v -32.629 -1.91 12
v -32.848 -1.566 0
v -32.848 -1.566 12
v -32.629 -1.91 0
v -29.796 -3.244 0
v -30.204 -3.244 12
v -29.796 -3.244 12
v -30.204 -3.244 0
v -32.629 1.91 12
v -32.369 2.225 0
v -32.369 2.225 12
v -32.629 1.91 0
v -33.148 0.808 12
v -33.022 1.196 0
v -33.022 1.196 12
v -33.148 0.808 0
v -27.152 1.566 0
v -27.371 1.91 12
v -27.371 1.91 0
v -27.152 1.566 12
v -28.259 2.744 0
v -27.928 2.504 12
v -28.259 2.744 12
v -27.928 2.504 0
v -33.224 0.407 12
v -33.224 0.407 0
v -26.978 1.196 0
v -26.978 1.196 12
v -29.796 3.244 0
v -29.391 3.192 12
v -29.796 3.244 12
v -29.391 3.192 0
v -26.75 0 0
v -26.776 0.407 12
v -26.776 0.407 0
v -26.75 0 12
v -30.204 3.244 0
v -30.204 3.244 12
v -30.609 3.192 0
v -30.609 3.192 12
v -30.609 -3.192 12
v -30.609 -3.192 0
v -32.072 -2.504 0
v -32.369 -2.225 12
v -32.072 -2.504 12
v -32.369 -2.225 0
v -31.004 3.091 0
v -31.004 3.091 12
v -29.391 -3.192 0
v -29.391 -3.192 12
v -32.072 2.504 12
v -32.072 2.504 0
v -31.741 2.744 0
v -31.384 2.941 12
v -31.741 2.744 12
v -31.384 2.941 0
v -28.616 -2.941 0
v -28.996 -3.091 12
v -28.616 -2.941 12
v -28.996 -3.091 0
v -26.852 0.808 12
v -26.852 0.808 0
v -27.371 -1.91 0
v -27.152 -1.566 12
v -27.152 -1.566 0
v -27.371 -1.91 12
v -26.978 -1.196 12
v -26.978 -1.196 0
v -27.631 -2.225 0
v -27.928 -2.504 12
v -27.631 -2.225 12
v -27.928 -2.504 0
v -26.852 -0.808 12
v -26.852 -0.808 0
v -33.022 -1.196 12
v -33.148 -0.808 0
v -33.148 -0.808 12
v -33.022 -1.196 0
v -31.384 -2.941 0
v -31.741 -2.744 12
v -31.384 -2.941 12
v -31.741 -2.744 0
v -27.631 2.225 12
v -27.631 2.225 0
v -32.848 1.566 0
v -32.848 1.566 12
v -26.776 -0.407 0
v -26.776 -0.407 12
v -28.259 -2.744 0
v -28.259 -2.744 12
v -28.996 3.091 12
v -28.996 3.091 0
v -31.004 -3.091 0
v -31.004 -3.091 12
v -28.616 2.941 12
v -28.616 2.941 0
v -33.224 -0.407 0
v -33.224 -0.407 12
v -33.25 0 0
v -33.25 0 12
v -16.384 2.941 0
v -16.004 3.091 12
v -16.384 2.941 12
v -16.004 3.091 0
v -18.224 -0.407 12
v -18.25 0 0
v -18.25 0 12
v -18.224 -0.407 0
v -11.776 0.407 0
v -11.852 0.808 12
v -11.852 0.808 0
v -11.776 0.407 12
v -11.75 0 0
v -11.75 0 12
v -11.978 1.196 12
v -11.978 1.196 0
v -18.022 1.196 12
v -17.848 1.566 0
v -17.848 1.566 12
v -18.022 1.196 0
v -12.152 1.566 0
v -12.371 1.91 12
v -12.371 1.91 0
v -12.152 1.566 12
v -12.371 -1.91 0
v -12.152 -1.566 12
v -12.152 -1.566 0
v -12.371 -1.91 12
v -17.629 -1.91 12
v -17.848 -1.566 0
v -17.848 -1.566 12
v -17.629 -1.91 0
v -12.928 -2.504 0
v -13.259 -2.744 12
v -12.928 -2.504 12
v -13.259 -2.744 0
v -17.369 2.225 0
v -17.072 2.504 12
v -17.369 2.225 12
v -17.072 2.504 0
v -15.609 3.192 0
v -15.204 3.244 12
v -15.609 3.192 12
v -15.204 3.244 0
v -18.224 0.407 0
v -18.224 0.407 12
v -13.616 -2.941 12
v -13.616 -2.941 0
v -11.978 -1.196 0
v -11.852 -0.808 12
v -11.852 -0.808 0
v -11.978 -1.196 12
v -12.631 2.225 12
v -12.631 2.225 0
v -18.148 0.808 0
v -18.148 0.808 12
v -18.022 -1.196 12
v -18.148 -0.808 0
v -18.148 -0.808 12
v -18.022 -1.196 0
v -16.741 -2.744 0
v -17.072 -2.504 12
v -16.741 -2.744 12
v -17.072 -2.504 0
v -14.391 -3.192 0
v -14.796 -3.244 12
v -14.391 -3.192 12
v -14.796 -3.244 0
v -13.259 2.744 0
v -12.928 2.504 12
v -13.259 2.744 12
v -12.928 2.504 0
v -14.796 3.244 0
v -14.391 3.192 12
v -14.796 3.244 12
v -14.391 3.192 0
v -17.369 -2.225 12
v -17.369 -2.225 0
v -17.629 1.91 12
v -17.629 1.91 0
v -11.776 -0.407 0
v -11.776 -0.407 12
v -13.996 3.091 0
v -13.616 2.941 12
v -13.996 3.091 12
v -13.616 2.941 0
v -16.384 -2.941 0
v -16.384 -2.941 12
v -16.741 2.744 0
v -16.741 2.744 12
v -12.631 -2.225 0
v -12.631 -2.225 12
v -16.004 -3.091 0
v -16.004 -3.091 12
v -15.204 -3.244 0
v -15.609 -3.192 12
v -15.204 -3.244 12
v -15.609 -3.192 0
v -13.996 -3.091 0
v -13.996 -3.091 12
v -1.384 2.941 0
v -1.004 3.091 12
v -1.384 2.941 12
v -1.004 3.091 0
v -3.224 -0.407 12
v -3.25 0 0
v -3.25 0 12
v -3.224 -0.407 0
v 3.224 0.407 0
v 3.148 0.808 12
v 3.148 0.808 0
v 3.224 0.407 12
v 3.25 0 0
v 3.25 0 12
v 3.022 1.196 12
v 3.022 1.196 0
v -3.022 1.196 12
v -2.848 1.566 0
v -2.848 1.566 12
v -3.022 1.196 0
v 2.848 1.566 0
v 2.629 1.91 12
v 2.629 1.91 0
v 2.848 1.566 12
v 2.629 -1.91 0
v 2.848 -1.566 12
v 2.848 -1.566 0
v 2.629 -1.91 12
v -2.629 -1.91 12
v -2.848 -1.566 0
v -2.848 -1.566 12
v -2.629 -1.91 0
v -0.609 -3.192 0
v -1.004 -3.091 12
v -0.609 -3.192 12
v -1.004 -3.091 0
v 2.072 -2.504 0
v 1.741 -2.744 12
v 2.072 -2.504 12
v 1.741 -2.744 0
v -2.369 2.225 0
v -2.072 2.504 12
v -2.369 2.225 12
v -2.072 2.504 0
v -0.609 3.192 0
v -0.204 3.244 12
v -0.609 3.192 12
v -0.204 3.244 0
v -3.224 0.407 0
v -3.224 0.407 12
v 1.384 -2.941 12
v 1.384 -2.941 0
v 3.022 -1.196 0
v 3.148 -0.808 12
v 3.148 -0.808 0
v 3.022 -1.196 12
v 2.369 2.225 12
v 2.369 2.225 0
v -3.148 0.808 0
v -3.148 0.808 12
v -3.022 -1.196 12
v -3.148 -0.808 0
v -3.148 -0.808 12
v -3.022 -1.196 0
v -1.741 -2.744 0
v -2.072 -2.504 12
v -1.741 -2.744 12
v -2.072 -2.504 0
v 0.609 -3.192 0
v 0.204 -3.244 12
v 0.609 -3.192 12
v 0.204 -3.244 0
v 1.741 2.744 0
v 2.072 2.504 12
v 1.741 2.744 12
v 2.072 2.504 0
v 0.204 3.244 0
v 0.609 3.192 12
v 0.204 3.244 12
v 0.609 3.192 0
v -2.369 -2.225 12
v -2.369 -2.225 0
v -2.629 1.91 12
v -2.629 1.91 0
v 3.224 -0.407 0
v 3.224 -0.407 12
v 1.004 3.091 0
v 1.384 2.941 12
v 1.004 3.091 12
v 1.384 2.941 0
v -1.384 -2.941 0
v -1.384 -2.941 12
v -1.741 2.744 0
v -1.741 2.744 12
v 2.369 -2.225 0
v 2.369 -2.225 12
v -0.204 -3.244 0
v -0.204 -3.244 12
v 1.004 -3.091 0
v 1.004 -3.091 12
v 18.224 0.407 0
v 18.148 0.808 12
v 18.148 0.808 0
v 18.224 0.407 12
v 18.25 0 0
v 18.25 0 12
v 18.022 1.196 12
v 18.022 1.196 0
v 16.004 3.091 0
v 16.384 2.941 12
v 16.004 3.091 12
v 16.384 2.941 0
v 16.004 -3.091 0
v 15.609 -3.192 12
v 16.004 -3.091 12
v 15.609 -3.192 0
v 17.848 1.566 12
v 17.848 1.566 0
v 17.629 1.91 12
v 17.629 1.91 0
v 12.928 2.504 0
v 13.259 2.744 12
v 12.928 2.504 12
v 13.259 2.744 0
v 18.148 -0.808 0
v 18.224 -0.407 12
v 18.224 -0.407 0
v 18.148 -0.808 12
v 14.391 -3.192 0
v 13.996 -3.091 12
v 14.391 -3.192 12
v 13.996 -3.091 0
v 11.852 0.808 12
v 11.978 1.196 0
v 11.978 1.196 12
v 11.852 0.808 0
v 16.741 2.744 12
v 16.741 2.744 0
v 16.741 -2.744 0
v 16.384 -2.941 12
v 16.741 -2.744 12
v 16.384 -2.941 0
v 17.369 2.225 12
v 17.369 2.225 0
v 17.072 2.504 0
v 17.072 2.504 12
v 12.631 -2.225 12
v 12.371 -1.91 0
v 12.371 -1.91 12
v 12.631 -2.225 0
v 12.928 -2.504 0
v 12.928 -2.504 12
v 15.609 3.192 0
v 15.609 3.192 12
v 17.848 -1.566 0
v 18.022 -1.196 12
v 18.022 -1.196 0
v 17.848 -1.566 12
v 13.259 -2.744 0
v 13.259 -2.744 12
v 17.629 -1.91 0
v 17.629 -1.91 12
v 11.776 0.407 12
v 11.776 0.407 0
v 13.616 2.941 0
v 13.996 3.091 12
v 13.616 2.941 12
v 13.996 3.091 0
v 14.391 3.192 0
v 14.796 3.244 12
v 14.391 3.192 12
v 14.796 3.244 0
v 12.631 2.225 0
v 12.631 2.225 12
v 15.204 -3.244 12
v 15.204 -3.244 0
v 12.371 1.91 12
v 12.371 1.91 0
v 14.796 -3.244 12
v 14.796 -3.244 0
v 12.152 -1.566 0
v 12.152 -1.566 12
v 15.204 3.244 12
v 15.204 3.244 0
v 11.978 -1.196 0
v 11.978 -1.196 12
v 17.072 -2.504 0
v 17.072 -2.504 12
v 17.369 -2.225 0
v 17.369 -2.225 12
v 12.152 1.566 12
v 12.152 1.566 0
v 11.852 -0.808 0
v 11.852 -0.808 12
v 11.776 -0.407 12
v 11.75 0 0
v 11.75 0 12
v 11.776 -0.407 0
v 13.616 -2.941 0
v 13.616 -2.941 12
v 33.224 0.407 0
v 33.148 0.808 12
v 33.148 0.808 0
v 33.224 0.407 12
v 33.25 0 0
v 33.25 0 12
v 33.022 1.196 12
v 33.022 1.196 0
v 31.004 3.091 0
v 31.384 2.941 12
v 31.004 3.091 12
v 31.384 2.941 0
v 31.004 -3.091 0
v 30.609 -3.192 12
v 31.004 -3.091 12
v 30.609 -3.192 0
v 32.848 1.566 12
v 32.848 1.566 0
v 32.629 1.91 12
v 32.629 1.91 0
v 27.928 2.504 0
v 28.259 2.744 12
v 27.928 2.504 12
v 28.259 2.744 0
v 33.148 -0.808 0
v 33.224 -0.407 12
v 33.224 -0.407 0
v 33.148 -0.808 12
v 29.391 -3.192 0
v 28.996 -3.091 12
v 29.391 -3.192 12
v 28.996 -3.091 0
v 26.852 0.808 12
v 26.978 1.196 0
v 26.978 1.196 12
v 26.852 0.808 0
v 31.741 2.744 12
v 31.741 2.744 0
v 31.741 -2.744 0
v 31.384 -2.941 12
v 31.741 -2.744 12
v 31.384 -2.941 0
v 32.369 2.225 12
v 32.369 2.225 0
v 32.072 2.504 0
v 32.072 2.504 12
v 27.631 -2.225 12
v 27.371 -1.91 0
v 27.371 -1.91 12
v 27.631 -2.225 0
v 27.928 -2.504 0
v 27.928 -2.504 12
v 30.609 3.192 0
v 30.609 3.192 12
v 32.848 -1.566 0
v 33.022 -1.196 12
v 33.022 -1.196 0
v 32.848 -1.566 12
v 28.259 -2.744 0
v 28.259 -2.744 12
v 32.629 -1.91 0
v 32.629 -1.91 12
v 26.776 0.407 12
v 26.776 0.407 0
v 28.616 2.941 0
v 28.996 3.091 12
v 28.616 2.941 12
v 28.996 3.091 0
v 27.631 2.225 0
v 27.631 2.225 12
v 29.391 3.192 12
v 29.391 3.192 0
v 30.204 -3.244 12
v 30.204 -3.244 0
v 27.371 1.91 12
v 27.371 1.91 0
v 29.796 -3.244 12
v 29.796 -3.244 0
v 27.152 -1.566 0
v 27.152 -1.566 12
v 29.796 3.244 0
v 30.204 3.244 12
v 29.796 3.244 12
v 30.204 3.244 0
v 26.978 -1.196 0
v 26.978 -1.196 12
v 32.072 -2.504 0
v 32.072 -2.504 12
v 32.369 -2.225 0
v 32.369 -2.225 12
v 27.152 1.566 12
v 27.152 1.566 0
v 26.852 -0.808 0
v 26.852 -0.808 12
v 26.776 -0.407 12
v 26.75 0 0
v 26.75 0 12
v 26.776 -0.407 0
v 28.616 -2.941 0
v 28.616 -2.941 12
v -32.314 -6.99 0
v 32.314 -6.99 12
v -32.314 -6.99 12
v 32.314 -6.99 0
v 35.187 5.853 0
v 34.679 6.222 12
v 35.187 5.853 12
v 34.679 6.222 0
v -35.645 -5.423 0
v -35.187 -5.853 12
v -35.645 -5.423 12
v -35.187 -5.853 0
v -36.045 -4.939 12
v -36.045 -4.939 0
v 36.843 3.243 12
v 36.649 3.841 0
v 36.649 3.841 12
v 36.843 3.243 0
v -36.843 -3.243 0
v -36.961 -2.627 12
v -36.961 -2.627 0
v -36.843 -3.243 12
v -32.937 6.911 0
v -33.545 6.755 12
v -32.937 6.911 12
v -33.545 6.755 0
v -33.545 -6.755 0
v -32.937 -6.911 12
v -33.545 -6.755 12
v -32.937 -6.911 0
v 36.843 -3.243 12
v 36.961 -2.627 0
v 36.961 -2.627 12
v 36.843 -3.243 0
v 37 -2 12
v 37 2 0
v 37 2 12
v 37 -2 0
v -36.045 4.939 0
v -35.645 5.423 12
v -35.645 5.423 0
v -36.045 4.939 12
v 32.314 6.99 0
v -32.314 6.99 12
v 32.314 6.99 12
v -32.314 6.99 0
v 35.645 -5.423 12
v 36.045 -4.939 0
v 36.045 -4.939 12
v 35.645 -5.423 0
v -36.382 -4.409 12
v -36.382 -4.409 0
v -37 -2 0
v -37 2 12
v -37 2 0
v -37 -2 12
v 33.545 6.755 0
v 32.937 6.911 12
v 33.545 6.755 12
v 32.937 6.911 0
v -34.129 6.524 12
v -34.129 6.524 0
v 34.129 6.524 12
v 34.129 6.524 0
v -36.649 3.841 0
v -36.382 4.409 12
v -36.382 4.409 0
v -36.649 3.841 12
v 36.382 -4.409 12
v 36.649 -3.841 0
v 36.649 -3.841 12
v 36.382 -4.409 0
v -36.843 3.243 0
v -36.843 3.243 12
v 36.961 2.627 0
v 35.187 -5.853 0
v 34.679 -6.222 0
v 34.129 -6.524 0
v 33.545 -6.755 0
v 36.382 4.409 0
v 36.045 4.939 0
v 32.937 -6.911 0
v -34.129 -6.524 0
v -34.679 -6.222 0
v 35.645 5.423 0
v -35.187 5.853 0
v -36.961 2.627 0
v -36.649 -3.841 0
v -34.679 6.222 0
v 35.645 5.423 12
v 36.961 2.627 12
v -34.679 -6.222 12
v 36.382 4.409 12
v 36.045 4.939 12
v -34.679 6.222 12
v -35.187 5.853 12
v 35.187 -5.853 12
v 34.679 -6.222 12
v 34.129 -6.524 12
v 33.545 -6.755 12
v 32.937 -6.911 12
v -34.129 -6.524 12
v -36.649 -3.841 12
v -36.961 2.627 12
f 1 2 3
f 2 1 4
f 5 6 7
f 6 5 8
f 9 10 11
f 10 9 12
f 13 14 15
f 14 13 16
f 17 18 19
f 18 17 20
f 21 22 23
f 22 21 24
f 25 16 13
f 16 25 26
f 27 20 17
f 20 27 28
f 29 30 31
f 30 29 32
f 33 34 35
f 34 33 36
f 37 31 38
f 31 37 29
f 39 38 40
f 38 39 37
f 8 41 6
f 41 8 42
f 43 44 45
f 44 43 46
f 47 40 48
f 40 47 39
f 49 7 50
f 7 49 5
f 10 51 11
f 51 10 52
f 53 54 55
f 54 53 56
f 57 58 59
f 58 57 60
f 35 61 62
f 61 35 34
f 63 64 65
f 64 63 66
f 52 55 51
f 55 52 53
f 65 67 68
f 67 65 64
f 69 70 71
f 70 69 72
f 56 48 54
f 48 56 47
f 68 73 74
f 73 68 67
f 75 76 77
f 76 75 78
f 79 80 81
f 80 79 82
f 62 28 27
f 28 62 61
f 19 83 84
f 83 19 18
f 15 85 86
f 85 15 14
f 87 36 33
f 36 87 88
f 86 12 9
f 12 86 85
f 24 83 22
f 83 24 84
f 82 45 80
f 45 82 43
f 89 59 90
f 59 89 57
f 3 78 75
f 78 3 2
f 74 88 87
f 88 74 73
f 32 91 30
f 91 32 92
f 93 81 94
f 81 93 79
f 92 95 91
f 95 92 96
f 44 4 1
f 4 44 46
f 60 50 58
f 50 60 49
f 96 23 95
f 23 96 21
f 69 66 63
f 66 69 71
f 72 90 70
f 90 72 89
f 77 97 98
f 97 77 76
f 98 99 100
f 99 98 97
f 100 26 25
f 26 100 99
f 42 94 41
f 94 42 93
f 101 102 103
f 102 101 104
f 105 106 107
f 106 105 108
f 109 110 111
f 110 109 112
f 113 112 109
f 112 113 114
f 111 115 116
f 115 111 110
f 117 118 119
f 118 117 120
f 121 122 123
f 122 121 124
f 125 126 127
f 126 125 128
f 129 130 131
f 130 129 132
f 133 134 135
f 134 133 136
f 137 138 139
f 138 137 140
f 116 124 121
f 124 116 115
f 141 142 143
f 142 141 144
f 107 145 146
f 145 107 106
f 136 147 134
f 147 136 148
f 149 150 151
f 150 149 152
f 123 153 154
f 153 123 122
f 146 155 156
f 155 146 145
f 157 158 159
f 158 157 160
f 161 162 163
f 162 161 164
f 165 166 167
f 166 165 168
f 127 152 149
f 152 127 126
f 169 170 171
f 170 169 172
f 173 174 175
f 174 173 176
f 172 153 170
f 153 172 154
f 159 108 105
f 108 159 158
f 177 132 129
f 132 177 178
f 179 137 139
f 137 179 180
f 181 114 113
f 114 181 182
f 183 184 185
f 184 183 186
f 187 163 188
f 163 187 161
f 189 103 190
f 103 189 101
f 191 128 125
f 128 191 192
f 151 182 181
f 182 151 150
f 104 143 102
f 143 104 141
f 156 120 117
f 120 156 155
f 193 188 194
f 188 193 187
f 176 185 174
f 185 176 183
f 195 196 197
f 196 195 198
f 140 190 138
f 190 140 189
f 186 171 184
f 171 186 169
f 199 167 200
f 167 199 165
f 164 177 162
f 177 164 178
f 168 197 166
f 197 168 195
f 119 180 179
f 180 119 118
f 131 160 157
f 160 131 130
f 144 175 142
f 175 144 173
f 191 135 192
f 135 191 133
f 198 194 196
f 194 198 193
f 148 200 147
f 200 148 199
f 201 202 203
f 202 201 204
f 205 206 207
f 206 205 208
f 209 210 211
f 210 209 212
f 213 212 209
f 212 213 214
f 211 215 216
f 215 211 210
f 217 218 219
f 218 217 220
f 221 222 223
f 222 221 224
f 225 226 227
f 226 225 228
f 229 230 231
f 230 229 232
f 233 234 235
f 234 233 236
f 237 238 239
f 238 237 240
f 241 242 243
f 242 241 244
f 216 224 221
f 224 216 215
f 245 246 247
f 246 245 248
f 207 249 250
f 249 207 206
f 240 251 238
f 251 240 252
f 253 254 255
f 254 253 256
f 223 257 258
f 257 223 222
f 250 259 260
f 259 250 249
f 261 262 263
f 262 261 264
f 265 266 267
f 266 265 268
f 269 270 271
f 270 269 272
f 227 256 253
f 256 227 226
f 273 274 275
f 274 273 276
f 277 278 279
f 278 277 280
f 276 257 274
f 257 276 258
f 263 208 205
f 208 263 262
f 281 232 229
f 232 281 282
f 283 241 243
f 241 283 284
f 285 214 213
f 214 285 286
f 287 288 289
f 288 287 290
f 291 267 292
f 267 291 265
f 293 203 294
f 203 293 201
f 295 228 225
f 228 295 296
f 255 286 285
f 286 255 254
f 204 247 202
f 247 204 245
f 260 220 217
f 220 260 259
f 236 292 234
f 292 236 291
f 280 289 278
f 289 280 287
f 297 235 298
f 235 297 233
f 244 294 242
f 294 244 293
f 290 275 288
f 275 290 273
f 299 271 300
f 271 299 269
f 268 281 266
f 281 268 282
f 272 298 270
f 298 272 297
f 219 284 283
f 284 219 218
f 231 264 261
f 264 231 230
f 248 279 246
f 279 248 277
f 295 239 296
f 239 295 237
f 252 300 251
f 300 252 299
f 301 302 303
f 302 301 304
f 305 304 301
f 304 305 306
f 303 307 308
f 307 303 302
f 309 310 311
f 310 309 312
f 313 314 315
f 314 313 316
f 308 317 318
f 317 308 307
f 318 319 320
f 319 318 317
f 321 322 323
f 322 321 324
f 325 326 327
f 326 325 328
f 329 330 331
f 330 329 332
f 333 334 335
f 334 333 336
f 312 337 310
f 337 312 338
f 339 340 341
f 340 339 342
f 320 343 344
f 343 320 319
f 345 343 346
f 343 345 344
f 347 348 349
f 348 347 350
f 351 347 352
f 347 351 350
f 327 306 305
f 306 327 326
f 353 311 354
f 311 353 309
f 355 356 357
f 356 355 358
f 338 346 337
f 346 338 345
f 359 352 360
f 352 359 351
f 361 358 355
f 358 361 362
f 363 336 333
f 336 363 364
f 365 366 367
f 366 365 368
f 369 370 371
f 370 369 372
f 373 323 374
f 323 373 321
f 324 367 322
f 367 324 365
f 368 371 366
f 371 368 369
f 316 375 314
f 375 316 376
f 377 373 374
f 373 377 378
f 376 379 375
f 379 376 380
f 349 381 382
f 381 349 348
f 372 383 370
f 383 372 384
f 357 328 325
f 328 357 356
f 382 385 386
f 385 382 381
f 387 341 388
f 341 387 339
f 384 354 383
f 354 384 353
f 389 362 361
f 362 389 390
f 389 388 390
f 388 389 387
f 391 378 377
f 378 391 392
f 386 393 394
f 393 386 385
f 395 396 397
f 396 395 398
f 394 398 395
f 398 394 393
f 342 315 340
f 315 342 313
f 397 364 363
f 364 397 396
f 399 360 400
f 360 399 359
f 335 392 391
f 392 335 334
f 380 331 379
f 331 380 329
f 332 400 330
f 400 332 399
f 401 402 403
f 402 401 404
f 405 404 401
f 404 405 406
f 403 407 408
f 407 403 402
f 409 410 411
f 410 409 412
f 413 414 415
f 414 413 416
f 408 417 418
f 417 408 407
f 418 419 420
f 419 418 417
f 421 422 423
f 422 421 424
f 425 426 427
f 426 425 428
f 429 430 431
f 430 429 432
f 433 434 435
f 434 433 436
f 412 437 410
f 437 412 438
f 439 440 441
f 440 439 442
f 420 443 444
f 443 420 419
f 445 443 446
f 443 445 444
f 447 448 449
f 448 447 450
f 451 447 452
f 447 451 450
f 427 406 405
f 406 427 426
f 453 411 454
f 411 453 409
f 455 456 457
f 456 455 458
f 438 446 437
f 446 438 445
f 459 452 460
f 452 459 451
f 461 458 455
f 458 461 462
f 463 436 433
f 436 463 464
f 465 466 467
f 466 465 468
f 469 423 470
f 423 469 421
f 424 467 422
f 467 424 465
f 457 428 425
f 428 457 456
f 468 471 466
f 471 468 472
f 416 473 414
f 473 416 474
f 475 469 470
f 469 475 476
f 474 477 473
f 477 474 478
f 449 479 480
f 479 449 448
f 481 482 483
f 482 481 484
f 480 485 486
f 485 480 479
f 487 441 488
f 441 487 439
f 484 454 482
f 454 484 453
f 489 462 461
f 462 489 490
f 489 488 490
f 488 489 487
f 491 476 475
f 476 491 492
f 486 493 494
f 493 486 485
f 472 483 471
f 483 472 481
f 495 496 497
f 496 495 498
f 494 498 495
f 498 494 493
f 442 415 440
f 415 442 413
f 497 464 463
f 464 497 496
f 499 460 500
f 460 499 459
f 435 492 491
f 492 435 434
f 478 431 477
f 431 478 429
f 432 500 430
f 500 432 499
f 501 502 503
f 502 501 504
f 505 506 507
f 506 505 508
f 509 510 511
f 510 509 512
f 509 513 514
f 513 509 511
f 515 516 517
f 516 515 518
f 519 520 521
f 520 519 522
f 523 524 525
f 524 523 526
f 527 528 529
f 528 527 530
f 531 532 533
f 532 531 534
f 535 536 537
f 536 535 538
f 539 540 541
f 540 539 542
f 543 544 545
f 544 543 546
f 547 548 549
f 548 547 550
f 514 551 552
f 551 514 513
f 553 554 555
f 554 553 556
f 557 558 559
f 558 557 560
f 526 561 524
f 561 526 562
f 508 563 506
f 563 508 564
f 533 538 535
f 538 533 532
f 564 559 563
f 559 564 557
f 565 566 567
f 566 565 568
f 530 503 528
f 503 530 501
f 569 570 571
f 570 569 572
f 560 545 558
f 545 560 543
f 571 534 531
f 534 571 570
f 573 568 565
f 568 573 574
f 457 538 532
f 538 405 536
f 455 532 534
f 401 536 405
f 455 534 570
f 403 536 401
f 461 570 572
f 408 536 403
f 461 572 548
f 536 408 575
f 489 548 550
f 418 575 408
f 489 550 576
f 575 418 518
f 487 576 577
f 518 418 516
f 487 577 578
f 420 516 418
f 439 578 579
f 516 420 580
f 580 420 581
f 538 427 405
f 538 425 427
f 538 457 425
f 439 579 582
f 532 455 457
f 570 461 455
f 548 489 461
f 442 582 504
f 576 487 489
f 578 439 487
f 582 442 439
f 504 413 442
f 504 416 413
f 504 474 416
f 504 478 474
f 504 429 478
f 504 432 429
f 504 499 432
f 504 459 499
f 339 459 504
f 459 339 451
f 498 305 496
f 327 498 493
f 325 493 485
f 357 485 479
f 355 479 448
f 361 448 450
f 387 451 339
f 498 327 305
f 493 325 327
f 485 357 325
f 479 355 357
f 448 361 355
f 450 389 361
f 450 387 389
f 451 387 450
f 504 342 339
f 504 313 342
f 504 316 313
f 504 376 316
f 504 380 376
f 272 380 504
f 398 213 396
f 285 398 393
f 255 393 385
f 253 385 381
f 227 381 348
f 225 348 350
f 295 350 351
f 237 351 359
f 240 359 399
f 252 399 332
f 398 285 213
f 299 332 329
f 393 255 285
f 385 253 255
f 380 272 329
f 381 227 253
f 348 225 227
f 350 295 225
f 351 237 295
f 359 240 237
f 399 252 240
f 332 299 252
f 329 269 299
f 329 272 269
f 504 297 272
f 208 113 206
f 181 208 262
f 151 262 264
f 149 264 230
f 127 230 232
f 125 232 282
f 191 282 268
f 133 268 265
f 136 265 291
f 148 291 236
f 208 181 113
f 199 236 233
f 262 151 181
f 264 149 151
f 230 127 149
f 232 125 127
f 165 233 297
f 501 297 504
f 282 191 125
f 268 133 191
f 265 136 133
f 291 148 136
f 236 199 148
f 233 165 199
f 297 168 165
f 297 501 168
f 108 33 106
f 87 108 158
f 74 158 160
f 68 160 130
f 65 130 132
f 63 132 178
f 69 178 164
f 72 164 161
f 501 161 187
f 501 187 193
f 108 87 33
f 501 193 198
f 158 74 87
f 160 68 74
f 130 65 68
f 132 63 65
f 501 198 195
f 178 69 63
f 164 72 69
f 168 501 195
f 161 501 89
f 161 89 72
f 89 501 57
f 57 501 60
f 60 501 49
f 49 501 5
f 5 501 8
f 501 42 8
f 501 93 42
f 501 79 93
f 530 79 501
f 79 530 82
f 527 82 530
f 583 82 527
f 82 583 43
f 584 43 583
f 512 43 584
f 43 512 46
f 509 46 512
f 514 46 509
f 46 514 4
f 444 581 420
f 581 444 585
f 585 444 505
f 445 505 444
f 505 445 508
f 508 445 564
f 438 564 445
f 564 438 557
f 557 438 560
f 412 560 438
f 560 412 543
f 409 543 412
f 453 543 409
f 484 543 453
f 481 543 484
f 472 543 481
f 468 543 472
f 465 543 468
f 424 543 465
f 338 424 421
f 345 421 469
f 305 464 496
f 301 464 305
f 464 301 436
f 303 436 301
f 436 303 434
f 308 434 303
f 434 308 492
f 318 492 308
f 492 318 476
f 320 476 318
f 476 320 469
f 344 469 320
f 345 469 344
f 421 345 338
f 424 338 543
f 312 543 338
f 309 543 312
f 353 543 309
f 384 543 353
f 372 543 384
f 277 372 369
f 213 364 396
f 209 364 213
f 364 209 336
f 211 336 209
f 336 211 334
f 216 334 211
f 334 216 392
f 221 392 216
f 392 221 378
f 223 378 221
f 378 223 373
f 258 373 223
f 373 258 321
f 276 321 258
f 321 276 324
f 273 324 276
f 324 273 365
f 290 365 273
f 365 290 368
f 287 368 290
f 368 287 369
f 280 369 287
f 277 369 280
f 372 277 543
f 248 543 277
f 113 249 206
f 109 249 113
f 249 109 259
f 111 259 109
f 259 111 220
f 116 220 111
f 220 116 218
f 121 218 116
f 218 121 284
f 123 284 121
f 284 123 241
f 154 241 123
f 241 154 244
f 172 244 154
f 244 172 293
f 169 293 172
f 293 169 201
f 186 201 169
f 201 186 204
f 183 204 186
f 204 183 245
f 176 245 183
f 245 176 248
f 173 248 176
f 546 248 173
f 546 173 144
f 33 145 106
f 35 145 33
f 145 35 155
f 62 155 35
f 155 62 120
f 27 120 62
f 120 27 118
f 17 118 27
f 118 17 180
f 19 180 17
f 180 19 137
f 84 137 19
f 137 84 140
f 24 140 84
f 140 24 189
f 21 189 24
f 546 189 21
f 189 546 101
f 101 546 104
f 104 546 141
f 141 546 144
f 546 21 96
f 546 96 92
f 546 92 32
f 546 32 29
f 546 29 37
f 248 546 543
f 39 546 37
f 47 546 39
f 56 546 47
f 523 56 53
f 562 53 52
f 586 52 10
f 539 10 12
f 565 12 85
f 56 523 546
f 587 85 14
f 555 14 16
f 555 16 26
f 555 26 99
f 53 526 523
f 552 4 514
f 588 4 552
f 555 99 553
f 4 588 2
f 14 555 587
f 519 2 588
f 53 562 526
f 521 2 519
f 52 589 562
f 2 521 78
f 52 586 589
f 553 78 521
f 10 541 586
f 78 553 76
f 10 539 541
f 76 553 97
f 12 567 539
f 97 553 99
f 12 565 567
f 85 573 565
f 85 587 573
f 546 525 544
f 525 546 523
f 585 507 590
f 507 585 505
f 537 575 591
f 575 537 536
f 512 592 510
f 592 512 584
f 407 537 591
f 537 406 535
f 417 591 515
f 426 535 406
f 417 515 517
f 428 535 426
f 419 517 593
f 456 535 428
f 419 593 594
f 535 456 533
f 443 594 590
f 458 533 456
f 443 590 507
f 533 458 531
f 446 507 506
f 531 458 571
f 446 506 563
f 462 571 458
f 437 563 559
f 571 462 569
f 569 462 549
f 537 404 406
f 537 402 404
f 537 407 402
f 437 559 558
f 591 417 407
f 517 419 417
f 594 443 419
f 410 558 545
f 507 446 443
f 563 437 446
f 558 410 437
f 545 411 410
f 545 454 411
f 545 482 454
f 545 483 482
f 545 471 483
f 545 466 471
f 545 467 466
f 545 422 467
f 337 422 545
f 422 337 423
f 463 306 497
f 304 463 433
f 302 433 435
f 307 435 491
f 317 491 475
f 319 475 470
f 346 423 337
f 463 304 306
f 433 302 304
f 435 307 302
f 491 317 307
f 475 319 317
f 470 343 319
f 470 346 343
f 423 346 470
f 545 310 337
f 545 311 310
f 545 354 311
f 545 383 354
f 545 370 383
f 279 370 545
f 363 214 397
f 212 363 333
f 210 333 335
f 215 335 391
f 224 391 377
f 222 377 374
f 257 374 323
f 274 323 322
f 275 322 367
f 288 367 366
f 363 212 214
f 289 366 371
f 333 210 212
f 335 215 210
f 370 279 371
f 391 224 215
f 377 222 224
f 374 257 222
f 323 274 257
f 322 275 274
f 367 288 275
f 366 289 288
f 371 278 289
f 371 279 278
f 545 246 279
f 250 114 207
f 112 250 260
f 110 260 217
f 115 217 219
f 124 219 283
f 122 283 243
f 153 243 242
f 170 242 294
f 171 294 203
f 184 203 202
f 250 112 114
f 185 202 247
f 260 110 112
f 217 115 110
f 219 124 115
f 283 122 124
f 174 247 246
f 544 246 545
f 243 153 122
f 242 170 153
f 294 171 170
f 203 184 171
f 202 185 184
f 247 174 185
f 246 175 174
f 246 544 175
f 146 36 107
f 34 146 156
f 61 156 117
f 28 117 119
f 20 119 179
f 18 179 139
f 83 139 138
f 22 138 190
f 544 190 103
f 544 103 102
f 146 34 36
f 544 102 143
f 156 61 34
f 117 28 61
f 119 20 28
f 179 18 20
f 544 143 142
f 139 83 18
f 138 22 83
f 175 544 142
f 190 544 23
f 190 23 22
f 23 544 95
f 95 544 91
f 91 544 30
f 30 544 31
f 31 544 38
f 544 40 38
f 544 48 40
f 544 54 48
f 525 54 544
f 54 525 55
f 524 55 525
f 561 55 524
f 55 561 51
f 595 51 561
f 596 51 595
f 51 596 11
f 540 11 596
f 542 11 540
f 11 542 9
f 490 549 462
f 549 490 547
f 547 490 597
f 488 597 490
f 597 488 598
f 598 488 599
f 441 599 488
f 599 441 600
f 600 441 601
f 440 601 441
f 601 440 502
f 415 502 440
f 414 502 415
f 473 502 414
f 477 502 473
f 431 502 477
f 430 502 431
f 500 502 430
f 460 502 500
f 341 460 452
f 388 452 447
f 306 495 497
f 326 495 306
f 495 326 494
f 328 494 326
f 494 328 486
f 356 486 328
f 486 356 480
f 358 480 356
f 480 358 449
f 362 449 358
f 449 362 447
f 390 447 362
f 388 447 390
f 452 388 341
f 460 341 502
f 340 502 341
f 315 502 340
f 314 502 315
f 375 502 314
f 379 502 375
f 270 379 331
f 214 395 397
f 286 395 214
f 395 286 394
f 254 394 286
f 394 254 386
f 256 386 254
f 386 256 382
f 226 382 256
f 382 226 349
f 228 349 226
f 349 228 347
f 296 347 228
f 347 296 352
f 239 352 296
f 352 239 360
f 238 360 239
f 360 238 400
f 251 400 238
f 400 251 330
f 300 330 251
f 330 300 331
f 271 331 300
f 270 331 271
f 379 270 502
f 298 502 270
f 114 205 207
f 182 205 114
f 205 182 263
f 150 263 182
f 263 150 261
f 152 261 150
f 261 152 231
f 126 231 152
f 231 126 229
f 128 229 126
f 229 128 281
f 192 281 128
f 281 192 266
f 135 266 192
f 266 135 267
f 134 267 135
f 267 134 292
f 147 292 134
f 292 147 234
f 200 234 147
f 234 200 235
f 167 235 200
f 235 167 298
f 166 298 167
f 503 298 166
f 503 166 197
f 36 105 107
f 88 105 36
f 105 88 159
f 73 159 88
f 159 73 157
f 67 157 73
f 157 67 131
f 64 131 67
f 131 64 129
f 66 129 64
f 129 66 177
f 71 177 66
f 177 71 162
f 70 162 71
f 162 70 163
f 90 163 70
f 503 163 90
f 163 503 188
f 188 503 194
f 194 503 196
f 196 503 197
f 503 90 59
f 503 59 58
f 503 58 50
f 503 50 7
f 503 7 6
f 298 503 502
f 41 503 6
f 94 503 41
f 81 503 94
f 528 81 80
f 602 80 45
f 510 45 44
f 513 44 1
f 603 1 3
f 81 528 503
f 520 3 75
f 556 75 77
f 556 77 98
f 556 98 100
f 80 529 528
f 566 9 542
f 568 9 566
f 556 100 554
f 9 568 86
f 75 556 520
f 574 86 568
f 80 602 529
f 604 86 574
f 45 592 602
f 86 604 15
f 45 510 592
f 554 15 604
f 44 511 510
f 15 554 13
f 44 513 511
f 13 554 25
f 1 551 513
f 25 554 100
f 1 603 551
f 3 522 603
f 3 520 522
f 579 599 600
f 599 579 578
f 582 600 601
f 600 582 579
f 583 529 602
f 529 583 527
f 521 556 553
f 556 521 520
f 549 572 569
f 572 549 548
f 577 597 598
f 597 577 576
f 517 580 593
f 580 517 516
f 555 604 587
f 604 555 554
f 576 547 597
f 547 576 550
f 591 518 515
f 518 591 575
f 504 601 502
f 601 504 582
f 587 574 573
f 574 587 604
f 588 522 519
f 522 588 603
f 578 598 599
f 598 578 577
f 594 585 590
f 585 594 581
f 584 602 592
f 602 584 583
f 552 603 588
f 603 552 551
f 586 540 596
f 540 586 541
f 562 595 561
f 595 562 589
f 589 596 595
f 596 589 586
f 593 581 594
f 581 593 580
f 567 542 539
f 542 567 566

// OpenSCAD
$fn = 50;


difference() {
	union() {
		hull() {
			translate(v = [-32.0000000000, 2.0000000000, 0]) {
				cylinder(h = 12, r = 5);
			}
			translate(v = [32.0000000000, 2.0000000000, 0]) {
				cylinder(h = 12, r = 5);
			}
			translate(v = [-32.0000000000, -2.0000000000, 0]) {
				cylinder(h = 12, r = 5);
			}
			translate(v = [32.0000000000, -2.0000000000, 0]) {
				cylinder(h = 12, r = 5);
			}
		}
	}
	union() {
		translate(v = [-30.0000000000, 0.0000000000, 0]) {
			translate(v = [0, 0, -100]) {
				cylinder(h = 200, r = 3.2500000000);
			}
		}
		translate(v = [-15.0000000000, 0.0000000000, 0]) {
			translate(v = [0, 0, -100]) {
				cylinder(h = 200, r = 3.2500000000);
			}
		}
		translate(v = [0, 0, -100]) {
			cylinder(h = 200, r = 3.2500000000);
		}
		translate(v = [15.0000000000, 0.0000000000, 0]) {
			translate(v = [0, 0, -100]) {
				cylinder(h = 200, r = 3.2500000000);
			}
		}
		translate(v = [30.0000000000, 0.0000000000, 0]) {
			translate(v = [0, 0, -100]) {
				cylinder(h = 200, r = 3.2500000000);
			}
		}
	}
}
